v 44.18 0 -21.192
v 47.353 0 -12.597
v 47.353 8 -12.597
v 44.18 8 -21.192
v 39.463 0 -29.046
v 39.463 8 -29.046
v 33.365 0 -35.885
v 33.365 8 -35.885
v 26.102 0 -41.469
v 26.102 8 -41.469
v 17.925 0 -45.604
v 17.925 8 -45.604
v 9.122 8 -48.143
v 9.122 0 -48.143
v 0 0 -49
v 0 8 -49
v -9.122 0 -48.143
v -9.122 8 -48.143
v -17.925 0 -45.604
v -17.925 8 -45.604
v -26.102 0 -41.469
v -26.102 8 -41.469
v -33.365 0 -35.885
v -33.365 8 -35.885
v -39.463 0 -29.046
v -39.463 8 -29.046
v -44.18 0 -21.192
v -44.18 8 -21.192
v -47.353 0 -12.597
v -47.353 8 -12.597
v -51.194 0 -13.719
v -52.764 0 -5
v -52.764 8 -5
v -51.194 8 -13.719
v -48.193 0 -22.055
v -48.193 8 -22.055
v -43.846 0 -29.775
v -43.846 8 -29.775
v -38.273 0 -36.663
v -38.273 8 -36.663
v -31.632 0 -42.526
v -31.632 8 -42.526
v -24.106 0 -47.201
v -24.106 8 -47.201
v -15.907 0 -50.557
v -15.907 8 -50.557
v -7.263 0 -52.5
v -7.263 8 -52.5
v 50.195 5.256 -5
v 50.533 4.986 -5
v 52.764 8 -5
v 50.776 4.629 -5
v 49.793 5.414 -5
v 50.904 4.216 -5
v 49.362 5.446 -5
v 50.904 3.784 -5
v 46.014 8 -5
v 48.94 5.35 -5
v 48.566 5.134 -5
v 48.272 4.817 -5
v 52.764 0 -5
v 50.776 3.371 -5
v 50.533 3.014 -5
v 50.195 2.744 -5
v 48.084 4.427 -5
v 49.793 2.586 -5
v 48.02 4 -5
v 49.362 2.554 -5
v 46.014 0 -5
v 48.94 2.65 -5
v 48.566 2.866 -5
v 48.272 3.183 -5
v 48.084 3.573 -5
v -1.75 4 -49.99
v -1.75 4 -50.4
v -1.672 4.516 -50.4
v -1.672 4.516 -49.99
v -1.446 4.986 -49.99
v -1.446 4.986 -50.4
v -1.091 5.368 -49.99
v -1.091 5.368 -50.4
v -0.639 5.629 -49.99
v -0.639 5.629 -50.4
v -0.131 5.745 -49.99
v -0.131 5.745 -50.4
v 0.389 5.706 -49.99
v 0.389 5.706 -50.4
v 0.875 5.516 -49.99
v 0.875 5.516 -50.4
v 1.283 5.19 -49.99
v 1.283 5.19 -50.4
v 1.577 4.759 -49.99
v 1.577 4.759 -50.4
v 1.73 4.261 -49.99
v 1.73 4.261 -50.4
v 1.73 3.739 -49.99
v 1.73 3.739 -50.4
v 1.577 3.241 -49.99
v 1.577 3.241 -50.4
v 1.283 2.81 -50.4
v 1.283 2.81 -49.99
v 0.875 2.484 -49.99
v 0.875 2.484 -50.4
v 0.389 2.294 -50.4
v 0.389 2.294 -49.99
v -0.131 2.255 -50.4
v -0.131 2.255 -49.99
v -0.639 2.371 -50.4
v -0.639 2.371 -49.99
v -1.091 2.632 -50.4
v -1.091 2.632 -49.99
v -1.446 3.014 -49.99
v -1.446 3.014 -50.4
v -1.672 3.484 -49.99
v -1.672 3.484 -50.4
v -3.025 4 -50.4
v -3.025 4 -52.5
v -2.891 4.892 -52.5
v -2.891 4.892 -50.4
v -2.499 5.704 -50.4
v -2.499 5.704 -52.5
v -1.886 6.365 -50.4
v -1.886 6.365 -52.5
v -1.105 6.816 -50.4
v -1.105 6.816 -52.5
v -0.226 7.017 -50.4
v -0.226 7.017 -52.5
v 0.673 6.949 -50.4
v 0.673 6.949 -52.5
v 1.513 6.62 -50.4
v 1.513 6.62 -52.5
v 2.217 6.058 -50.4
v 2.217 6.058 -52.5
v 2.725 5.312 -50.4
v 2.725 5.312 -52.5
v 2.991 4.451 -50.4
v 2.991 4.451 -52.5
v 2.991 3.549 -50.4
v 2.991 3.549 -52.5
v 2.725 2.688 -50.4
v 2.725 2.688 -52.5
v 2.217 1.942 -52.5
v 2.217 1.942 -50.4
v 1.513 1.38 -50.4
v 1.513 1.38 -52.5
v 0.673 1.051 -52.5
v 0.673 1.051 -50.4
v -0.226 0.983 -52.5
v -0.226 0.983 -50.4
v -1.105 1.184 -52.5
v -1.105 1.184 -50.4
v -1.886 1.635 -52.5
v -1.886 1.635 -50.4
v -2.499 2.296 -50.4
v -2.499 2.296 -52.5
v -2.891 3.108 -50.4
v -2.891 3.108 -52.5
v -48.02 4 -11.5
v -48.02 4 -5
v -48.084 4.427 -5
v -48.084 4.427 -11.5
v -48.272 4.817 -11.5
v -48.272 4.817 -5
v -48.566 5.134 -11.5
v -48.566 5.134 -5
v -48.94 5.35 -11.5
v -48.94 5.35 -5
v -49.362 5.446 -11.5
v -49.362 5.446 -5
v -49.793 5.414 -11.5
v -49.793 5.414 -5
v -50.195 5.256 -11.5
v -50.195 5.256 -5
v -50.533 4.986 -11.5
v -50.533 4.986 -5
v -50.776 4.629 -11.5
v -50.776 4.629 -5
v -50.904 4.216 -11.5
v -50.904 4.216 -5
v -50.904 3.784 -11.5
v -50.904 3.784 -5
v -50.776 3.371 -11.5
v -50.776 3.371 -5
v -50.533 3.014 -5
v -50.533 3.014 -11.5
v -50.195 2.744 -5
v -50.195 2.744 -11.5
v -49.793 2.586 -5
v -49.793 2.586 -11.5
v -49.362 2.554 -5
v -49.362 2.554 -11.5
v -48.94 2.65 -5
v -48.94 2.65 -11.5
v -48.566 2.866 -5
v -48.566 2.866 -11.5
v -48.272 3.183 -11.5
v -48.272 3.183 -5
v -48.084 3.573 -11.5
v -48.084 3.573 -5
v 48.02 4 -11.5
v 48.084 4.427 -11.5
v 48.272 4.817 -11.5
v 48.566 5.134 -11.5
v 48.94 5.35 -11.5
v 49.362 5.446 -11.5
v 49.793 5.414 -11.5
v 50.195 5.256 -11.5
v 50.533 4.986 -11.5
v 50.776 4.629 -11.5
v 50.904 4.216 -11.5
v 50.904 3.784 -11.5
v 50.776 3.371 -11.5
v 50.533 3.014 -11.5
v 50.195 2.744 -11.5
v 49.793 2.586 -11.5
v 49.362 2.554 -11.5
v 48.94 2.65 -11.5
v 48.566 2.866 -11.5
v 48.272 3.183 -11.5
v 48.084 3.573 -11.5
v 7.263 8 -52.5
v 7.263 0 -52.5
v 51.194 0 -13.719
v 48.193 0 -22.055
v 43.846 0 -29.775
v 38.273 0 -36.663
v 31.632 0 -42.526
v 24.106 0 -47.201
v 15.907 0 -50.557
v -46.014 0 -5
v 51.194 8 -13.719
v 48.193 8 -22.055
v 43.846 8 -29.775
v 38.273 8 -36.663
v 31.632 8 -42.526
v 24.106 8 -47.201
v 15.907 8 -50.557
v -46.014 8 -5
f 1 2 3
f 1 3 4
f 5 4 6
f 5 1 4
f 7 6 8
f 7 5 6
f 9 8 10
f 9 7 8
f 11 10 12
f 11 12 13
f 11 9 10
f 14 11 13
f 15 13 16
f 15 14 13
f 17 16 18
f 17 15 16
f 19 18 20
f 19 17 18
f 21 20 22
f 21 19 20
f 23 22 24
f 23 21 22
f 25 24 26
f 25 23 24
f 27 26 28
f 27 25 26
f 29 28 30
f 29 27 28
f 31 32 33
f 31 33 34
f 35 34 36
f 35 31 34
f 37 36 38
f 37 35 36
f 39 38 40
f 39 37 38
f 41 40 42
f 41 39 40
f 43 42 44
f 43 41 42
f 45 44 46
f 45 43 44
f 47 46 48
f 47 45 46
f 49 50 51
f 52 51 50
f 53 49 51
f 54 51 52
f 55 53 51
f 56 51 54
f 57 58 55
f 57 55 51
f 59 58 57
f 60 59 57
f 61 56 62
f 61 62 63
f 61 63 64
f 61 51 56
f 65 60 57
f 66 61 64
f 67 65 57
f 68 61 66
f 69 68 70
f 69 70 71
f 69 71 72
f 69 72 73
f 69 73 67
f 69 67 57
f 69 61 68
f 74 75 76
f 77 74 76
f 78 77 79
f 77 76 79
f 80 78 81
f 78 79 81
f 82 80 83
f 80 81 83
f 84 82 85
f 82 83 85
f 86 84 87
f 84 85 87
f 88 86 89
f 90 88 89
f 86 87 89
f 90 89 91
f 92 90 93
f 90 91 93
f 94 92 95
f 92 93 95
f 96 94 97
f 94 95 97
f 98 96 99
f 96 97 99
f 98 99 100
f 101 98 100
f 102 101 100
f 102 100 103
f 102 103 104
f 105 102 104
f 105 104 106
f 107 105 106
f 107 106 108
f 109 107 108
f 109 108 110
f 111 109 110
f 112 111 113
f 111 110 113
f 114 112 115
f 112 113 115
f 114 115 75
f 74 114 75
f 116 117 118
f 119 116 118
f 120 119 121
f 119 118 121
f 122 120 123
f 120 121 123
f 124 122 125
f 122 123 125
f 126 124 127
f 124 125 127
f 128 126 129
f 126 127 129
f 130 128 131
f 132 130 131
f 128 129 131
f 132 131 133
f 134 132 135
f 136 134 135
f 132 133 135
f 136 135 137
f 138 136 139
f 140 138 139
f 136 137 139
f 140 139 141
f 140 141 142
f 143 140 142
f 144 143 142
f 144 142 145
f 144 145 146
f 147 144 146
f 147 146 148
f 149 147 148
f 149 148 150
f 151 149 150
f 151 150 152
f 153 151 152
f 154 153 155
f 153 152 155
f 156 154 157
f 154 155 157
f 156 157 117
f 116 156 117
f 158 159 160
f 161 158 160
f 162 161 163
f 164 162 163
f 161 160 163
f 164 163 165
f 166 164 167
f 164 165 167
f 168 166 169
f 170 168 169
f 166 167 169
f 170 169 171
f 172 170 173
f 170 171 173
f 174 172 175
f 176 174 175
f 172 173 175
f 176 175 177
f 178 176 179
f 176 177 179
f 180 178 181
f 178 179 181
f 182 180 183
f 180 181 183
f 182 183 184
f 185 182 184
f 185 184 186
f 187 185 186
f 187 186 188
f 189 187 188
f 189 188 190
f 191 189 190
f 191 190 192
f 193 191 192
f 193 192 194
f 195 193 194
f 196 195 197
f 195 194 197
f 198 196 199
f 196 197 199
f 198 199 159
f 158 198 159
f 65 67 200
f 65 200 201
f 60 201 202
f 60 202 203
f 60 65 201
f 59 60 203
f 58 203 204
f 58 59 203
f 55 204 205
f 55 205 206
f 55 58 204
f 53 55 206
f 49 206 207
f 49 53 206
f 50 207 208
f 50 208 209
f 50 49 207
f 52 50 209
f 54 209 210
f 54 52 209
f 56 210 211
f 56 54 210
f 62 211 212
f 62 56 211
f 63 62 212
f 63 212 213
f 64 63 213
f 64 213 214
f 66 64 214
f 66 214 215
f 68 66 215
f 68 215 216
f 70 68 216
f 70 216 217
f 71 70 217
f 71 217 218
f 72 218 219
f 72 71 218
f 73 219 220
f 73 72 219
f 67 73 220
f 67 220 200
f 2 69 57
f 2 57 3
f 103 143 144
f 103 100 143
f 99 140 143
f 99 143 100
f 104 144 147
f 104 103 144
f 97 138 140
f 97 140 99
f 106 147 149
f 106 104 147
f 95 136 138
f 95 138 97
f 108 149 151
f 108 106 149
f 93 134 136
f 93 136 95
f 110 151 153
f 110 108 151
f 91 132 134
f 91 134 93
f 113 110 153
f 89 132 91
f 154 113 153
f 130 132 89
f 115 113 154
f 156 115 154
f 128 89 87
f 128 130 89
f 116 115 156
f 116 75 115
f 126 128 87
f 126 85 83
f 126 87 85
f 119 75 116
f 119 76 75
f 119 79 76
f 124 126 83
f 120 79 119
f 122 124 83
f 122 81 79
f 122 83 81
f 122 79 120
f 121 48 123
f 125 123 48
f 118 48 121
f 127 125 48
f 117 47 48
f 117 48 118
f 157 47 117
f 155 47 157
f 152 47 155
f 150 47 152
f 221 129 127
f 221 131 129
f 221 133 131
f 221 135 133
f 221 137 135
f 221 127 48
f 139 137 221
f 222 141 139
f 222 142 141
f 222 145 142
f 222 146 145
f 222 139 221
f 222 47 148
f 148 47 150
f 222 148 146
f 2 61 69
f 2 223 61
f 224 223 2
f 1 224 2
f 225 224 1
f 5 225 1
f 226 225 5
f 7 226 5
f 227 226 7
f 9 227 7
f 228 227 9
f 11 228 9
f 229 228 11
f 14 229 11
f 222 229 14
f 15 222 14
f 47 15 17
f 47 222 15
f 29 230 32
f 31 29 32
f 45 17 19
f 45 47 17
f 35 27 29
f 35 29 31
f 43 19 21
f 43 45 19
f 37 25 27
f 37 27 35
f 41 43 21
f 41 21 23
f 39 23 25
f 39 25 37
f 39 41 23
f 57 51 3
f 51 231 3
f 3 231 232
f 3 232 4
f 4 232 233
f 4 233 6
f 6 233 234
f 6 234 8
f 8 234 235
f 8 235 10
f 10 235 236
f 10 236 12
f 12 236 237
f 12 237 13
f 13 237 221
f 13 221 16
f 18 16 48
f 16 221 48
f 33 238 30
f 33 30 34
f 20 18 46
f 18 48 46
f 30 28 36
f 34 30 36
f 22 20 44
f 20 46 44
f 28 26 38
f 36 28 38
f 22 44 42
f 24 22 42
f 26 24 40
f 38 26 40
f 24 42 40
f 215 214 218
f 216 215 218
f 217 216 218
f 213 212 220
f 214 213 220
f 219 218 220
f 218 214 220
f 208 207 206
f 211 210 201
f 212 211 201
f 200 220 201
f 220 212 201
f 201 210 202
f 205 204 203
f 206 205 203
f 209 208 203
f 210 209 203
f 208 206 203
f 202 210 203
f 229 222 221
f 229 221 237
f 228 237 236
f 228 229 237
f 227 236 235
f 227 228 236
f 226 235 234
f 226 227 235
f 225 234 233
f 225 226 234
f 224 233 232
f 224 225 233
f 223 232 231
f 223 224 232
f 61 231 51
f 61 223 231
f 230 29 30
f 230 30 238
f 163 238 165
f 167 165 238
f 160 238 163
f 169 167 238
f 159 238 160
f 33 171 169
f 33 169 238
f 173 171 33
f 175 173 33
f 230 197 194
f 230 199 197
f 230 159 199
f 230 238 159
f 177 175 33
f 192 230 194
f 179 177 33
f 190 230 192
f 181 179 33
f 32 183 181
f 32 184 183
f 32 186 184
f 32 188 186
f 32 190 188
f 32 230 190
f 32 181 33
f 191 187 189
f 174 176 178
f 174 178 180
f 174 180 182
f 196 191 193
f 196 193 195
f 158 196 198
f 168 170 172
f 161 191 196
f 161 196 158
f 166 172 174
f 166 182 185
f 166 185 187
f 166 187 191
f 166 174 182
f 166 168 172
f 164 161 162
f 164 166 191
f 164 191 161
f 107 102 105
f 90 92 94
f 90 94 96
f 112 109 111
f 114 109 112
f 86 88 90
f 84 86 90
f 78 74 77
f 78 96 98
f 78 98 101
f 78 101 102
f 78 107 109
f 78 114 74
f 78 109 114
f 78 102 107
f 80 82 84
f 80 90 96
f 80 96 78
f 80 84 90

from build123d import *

# Parameters (mm, degrees)
BOSS_EXTRUDE1_DEPTH = 8
SKETCH4_R           = 3.025
CUT_EXTRUDE3_DEPTH  = 2.1
SKETCH5_R           = 1.45
CUT_EXTRUDE4_DEPTH  = 6.5
SKETCH6_R           = 1.75
CUT_EXTRUDE5_DEPTH  = 0.41


with BuildPart() as part:
    # Sketch1 → Boss-Extrude1 (new body)
    with BuildSketch(Plane(origin=(0, 0, 0), x_dir=(1, 0, 0), z_dir=(0, 1, 0))):
        with BuildLine():
            Line((52.763623833, 5), (46.013623833, 5))
            Line((46.013623833, 5), (47.353145997, 12.596807697))
            ThreePointArc((47.353145997, 12.596807697), (0, 49), (-47.353145997, 12.596807697))
            Line((-47.353145997, 12.596807697), (-46.013623833, 5))
            Line((-46.013623833, 5), (-52.763623833, 5))
            ThreePointArc((-52.763623833, 5), (-38.273476153, 36.66252887), (-7.262919523, 52.5))
            Line((-7.262919523, 52.5), (7.262919523, 52.5))
            ThreePointArc((7.262919523, 52.5), (38.273476153, 36.66252887), (52.763623833, 5))
        make_face()
    extrude(amount=BOSS_EXTRUDE1_DEPTH)

    # Sketch4 → Cut-Extrude3 (cut)
    with BuildSketch(Plane(origin=(0, 0, -52.5), x_dir=(-1, 0, 0), z_dir=(0, 0, -1))):
        with Locations((0, 4)):
            Circle(SKETCH4_R)
    extrude(amount=-CUT_EXTRUDE3_DEPTH, mode=Mode.SUBTRACT)

    # Sketch5 → Cut-Extrude4 (cut)
    with BuildSketch(Plane.XY.offset(-5)):
        with Locations((-49.47, 4)):
            Circle(SKETCH5_R)
    cut_extrude4 = extrude(amount=-CUT_EXTRUDE4_DEPTH, mode=Mode.SUBTRACT)

    # Mirror1: Cut-Extrude4 across plane
    add(cut_extrude4.mirror(Plane(origin=(0, 0, 0), x_dir=(0, 0, 1), z_dir=(1, 0, 0))), mode=Mode.SUBTRACT)

    # Sketch6 → Cut-Extrude5 (cut)
    with BuildSketch(Plane(origin=(0, 0, -50.4), x_dir=(-1, 0, 0), z_dir=(0, 0, -1))):
        with Locations((0, 4)):
            Circle(SKETCH6_R)
    extrude(amount=-CUT_EXTRUDE5_DEPTH, mode=Mode.SUBTRACT)


solid = part.part
